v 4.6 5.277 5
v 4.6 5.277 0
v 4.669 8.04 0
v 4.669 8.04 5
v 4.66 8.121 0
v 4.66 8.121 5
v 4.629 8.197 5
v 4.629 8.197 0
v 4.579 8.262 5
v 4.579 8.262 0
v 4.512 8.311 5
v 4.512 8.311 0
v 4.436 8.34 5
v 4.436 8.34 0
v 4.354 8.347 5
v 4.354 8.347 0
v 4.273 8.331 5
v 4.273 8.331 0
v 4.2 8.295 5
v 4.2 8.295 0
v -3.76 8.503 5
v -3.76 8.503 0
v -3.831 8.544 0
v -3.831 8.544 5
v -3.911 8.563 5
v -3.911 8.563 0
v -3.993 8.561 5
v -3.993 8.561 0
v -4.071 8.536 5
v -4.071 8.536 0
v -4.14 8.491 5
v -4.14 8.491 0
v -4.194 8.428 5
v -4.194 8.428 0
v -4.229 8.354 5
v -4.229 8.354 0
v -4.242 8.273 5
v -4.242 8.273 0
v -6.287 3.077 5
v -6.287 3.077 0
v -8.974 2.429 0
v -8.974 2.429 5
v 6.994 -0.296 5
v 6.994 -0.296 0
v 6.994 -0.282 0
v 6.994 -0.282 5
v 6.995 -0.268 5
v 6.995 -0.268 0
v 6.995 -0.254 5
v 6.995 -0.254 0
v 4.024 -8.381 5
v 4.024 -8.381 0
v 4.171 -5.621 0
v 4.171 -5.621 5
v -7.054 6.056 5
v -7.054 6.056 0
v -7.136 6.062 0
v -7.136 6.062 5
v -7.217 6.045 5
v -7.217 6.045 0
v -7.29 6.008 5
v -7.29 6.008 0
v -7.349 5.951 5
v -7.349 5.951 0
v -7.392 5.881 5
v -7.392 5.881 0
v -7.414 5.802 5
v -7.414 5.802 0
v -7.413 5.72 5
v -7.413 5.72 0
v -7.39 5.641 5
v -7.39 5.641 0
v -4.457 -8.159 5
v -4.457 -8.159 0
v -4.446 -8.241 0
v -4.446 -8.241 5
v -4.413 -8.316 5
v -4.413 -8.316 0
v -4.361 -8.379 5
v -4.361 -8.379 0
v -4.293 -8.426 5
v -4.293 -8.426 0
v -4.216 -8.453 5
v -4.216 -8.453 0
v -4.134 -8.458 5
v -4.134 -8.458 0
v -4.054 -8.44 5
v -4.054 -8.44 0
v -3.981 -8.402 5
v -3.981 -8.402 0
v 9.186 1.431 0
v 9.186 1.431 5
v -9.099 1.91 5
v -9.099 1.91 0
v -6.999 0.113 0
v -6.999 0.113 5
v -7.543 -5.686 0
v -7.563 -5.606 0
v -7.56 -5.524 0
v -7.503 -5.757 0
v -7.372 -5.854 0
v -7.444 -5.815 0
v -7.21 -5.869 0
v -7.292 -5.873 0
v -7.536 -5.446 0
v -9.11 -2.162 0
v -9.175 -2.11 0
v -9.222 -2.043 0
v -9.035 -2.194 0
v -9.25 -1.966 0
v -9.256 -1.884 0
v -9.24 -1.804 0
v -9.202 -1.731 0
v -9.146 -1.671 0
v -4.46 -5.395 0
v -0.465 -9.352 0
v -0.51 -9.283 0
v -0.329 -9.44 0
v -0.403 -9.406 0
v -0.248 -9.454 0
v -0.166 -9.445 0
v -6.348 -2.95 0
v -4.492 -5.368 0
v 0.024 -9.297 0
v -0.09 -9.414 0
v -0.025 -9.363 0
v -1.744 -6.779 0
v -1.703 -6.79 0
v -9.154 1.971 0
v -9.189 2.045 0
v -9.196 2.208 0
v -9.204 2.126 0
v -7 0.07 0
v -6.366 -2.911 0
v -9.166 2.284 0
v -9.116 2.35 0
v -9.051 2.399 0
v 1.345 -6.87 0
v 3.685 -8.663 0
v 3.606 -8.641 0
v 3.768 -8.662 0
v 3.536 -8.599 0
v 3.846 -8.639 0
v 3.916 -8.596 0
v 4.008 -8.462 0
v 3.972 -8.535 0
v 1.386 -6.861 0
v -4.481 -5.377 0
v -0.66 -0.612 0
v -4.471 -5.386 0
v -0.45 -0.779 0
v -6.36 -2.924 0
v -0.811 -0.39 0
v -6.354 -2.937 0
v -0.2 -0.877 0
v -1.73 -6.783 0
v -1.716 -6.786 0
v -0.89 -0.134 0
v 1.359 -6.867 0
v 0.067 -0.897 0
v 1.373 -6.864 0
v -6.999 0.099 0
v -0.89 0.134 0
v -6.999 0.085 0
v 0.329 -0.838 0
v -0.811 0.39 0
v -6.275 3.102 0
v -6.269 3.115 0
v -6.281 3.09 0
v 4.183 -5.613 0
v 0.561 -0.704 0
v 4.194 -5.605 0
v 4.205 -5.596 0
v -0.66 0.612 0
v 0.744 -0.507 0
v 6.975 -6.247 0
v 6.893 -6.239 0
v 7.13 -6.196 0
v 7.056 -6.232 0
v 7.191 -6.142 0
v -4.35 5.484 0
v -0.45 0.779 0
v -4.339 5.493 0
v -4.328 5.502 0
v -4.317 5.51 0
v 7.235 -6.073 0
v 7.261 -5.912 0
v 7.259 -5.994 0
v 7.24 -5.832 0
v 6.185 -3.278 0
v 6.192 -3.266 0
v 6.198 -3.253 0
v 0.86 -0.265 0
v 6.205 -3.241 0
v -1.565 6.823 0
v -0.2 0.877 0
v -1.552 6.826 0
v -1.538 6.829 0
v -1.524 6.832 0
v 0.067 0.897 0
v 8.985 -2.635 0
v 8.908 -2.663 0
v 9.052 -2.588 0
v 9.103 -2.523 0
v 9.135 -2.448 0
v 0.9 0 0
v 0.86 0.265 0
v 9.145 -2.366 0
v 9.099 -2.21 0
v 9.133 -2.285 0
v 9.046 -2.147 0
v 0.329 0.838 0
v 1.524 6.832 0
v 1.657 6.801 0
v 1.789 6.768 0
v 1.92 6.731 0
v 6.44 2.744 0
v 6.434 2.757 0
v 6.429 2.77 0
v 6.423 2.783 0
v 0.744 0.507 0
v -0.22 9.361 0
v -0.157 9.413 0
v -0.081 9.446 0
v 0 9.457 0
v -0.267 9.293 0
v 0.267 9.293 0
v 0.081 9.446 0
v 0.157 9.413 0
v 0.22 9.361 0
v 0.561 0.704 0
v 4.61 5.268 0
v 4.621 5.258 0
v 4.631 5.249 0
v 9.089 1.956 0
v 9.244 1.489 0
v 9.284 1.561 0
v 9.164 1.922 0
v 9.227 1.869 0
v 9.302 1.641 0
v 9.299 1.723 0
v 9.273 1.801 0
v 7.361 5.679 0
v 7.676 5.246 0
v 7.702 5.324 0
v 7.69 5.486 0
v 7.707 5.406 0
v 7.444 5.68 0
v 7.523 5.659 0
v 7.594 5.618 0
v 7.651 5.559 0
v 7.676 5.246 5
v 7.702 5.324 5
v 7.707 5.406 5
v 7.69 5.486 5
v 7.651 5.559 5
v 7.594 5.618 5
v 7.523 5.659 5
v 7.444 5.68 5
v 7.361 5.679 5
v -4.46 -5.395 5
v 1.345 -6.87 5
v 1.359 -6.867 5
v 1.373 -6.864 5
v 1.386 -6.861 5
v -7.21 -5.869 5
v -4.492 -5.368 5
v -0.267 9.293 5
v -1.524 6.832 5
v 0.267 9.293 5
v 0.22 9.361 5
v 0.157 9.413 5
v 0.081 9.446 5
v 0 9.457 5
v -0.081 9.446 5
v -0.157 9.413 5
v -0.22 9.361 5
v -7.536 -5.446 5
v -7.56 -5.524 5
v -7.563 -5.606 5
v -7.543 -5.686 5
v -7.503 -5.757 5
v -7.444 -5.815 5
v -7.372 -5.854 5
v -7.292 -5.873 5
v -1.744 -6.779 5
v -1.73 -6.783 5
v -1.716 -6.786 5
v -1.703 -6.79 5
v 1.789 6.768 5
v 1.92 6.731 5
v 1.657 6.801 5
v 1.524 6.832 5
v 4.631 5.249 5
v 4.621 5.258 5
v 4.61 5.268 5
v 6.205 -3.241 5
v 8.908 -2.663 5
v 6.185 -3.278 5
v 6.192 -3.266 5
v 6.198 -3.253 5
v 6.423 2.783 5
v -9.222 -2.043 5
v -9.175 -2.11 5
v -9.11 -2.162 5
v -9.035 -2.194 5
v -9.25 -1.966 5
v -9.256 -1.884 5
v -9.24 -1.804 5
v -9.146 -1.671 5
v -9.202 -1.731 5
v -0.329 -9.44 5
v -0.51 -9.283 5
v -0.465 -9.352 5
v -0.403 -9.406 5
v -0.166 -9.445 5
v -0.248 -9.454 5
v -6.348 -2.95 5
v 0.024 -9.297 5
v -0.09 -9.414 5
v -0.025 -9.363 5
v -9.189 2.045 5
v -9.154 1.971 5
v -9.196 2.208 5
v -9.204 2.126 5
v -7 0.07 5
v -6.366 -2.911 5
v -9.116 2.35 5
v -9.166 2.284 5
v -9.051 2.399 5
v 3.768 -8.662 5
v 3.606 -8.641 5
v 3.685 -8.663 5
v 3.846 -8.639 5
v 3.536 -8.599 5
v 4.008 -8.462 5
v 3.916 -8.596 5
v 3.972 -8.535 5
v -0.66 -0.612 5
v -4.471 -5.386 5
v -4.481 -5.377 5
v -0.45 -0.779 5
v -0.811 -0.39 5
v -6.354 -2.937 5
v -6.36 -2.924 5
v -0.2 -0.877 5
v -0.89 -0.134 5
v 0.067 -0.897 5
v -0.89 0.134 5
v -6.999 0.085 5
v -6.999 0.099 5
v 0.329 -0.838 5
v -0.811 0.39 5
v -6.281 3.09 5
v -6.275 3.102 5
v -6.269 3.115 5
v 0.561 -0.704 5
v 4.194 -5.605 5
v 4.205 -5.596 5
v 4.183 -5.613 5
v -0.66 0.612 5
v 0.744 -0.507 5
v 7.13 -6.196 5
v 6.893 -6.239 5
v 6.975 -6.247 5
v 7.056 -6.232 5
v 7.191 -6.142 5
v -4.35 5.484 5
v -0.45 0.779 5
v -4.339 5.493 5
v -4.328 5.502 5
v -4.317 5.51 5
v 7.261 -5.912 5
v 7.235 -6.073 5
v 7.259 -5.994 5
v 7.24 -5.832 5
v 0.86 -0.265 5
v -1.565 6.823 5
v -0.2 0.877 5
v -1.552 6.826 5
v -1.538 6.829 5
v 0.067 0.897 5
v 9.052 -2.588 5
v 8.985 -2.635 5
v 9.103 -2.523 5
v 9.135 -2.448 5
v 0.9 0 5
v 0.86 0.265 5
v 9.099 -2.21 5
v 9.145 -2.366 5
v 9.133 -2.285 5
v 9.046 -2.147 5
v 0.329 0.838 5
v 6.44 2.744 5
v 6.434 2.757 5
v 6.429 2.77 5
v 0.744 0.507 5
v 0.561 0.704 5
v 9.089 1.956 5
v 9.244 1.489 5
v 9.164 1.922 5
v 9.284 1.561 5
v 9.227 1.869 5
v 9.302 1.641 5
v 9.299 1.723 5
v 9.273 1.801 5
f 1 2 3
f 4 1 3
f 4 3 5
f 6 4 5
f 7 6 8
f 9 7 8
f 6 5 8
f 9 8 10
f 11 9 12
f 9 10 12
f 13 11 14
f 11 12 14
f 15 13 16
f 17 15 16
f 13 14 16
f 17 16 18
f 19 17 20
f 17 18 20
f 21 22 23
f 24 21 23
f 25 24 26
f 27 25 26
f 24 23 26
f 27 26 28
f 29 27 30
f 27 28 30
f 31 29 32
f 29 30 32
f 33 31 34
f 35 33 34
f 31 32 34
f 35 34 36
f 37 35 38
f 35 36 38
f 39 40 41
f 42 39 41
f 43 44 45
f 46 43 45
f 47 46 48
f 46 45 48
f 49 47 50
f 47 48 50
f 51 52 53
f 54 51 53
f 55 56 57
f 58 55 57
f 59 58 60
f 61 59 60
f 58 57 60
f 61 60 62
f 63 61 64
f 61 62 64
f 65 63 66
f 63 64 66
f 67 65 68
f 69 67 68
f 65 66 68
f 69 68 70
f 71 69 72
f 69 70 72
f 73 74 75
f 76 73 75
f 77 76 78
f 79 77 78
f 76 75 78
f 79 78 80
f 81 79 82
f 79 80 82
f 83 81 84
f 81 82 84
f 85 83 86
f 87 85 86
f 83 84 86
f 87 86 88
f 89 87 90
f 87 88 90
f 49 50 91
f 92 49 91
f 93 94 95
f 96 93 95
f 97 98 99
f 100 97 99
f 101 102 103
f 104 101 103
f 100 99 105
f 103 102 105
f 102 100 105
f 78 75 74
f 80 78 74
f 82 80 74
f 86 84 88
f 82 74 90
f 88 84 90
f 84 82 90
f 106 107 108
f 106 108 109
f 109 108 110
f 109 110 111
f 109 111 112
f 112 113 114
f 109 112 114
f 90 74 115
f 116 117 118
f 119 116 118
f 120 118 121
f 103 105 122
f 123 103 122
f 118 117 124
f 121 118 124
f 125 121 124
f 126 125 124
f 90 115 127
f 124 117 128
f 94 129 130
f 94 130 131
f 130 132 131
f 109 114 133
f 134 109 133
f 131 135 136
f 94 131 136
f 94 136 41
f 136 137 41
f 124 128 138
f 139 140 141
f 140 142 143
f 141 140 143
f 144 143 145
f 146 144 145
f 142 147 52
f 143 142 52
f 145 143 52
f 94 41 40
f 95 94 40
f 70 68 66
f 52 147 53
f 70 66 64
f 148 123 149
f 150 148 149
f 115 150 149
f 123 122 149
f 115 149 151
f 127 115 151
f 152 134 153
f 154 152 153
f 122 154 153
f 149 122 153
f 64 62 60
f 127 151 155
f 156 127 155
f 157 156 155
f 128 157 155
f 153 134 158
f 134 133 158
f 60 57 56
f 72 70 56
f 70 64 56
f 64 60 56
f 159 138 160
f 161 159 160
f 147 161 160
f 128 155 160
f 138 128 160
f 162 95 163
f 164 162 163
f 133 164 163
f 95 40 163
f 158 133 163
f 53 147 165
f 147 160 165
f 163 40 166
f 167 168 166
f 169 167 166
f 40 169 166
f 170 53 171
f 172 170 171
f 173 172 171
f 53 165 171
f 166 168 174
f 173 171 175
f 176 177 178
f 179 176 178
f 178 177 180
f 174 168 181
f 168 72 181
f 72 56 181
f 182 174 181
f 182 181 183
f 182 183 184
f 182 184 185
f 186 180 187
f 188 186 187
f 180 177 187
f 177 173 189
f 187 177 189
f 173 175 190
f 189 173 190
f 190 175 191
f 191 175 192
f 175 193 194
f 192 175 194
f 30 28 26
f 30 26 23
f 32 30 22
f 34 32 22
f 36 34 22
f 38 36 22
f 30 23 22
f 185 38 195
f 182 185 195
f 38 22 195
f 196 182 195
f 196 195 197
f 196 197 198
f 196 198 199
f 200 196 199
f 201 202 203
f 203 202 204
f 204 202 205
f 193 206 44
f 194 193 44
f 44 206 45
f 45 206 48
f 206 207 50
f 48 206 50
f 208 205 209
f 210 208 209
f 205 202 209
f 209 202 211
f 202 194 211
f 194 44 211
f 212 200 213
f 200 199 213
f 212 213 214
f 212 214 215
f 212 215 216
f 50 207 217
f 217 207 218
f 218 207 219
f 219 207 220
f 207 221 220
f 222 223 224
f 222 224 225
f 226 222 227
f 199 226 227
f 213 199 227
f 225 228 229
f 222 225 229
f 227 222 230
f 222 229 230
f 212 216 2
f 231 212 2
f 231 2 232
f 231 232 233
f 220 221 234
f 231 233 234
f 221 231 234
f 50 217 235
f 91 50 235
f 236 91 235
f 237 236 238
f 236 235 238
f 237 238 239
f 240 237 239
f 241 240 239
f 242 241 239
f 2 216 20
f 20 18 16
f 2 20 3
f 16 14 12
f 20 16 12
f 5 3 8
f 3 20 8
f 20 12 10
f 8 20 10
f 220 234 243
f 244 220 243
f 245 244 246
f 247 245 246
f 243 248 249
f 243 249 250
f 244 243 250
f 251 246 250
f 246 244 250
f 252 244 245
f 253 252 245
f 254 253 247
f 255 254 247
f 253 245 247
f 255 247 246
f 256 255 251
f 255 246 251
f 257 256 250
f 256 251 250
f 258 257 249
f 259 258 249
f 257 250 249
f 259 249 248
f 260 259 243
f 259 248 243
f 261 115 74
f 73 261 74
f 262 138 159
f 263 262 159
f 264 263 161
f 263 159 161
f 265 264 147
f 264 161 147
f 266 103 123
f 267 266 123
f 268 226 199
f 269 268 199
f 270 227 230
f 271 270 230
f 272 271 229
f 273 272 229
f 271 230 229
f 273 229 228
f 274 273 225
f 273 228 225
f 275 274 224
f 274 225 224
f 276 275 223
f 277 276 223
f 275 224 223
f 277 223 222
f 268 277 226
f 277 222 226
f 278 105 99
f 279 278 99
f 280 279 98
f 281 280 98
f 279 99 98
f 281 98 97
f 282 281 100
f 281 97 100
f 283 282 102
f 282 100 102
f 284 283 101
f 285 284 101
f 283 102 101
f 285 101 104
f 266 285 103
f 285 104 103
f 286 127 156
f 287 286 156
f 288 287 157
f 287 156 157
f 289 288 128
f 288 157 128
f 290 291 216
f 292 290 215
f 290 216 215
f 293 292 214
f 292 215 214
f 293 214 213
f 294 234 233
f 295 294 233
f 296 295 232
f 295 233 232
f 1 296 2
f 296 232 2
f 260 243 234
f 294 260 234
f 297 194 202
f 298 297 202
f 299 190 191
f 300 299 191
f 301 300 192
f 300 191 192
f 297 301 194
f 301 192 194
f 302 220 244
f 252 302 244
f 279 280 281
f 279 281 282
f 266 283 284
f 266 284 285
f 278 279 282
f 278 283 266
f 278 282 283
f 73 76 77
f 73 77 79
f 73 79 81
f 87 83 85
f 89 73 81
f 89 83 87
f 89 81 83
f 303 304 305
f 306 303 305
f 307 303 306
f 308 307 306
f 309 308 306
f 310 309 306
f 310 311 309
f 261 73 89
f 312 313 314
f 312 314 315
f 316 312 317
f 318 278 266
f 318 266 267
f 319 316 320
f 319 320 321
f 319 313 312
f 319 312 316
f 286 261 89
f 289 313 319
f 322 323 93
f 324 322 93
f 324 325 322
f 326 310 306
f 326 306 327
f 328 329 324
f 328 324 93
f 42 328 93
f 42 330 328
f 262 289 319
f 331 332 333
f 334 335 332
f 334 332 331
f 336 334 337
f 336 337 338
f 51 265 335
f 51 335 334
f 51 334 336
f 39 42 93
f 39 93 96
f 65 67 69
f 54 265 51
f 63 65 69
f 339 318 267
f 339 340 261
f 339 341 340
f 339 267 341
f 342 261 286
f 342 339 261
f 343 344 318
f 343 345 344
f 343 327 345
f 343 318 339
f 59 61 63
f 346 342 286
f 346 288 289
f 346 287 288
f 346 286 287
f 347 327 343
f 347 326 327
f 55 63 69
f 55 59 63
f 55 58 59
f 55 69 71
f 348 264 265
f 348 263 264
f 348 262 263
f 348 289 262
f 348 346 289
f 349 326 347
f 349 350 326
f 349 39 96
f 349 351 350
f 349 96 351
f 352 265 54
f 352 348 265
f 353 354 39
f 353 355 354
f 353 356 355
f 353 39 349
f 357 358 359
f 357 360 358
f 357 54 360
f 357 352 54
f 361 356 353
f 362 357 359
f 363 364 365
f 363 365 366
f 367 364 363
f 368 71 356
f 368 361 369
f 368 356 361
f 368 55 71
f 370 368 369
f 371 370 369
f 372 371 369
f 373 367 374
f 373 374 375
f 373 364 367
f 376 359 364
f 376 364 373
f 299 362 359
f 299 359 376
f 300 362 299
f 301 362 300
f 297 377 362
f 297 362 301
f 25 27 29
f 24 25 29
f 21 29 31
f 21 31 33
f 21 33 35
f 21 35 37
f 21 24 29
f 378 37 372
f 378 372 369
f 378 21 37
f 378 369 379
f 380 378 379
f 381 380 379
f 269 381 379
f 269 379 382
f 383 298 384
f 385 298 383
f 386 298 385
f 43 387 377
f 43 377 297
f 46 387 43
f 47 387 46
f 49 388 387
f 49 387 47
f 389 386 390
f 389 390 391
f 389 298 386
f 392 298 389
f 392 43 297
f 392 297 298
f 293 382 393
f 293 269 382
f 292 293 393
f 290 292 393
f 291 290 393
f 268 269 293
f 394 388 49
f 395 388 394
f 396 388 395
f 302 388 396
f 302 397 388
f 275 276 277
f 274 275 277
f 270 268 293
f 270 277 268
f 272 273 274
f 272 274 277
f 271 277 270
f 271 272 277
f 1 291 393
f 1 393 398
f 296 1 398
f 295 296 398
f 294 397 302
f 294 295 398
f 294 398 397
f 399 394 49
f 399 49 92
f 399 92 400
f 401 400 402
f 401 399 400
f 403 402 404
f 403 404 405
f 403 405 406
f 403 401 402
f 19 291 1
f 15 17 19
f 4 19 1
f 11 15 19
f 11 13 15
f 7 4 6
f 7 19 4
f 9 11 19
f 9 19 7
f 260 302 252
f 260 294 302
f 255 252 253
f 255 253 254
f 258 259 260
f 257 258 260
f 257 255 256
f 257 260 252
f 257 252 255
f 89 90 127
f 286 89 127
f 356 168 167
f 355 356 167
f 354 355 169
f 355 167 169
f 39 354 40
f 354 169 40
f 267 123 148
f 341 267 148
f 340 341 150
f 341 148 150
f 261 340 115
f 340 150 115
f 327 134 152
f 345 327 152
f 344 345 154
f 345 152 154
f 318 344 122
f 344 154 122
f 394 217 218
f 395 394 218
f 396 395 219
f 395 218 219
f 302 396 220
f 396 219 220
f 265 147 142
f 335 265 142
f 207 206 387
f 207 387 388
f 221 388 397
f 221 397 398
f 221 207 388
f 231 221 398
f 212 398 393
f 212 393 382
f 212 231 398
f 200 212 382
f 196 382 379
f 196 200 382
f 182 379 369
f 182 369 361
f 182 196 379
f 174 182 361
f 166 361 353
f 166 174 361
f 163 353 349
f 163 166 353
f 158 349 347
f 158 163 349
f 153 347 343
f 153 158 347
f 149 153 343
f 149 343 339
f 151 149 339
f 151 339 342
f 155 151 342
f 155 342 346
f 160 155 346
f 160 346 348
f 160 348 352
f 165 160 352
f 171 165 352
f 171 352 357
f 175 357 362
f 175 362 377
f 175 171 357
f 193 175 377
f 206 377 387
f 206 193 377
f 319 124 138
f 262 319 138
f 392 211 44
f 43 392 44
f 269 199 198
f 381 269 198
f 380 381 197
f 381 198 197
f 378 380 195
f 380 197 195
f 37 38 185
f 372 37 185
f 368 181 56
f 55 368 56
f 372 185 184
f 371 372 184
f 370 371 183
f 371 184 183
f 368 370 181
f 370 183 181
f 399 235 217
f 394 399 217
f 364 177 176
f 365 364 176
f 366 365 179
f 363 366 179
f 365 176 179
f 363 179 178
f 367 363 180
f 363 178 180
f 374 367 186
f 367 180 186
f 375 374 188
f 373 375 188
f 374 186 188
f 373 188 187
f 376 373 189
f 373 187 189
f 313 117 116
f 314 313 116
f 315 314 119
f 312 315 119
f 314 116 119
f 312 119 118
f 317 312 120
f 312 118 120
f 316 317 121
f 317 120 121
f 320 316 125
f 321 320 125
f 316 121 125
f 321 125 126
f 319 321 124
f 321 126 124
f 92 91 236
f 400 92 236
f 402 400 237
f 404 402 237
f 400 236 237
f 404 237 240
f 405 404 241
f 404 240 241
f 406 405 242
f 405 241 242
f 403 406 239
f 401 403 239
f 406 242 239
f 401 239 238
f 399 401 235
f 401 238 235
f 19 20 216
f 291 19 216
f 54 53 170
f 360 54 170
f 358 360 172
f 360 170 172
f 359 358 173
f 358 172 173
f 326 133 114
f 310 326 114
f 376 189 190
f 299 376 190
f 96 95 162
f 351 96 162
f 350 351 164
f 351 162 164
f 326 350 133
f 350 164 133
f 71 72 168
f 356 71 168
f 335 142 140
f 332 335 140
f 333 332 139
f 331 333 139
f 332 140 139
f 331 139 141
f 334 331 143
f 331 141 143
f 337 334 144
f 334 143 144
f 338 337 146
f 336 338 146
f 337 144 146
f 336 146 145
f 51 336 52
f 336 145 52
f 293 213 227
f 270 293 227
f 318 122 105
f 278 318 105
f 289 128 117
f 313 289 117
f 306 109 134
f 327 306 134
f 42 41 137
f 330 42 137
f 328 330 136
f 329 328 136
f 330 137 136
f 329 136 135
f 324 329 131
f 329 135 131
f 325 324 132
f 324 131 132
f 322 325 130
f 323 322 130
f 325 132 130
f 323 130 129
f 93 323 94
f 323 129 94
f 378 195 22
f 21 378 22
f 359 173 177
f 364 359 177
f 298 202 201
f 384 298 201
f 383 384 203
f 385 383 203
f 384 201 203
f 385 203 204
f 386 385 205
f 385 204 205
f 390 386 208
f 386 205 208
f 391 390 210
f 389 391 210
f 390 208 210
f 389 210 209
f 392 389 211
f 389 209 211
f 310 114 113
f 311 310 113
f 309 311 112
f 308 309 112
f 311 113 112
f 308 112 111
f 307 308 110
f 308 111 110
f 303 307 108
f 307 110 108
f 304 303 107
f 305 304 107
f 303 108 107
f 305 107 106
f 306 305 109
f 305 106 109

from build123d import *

# Parameters (mm, degrees)
SKETCH1_R           = 7
SKETCH1_R_2         = 0.9
BOSS_EXTRUDE1_DEPTH = 5
BOSS_EXTRUDE2_START = -5
BOSS_EXTRUDE2_DEPTH = 5
CIRPATTERN1_COUNT   = 14
CIRPATTERN1_ANGLE   = 331.5


with BuildPart() as part:
    # Sketch1 → Boss-Extrude1 (new body)
    with BuildSketch(Plane.XY):
        Circle(SKETCH1_R)
        Circle(SKETCH1_R_2, mode=Mode.SUBTRACT)
    extrude(amount=BOSS_EXTRUDE1_DEPTH)

    # Sketch2 → Boss-Extrude2 (add)
    with BuildSketch(Plane.XY.offset(5).offset(BOSS_EXTRUDE2_START)):
        with BuildLine():
            ThreePointArc((0.267172205, 9.293419284), (0, 9.456967781), (-0.267172205, 9.293419284))
            Line((-0.267172205, 9.293419284), (-1.524265806, 6.832028524))
            ThreePointArc((-1.524265806, 6.832028524), (0, 7), (1.524265806, 6.832028524))
            Line((1.524265806, 6.832028524), (0.267172205, 9.293419284))
        make_face()
    boss_extrude2 = extrude(amount=BOSS_EXTRUDE2_DEPTH)

    # CirPattern1: Boss-Extrude2 ×14 about axis
    cirpattern1_axis = Axis((0, 0, 0), (0, 0, 1))
    for i in range(1, CIRPATTERN1_COUNT):
        add(boss_extrude2.rotate(cirpattern1_axis, i * CIRPATTERN1_ANGLE / (CIRPATTERN1_COUNT - 1)))


solid = part.part
